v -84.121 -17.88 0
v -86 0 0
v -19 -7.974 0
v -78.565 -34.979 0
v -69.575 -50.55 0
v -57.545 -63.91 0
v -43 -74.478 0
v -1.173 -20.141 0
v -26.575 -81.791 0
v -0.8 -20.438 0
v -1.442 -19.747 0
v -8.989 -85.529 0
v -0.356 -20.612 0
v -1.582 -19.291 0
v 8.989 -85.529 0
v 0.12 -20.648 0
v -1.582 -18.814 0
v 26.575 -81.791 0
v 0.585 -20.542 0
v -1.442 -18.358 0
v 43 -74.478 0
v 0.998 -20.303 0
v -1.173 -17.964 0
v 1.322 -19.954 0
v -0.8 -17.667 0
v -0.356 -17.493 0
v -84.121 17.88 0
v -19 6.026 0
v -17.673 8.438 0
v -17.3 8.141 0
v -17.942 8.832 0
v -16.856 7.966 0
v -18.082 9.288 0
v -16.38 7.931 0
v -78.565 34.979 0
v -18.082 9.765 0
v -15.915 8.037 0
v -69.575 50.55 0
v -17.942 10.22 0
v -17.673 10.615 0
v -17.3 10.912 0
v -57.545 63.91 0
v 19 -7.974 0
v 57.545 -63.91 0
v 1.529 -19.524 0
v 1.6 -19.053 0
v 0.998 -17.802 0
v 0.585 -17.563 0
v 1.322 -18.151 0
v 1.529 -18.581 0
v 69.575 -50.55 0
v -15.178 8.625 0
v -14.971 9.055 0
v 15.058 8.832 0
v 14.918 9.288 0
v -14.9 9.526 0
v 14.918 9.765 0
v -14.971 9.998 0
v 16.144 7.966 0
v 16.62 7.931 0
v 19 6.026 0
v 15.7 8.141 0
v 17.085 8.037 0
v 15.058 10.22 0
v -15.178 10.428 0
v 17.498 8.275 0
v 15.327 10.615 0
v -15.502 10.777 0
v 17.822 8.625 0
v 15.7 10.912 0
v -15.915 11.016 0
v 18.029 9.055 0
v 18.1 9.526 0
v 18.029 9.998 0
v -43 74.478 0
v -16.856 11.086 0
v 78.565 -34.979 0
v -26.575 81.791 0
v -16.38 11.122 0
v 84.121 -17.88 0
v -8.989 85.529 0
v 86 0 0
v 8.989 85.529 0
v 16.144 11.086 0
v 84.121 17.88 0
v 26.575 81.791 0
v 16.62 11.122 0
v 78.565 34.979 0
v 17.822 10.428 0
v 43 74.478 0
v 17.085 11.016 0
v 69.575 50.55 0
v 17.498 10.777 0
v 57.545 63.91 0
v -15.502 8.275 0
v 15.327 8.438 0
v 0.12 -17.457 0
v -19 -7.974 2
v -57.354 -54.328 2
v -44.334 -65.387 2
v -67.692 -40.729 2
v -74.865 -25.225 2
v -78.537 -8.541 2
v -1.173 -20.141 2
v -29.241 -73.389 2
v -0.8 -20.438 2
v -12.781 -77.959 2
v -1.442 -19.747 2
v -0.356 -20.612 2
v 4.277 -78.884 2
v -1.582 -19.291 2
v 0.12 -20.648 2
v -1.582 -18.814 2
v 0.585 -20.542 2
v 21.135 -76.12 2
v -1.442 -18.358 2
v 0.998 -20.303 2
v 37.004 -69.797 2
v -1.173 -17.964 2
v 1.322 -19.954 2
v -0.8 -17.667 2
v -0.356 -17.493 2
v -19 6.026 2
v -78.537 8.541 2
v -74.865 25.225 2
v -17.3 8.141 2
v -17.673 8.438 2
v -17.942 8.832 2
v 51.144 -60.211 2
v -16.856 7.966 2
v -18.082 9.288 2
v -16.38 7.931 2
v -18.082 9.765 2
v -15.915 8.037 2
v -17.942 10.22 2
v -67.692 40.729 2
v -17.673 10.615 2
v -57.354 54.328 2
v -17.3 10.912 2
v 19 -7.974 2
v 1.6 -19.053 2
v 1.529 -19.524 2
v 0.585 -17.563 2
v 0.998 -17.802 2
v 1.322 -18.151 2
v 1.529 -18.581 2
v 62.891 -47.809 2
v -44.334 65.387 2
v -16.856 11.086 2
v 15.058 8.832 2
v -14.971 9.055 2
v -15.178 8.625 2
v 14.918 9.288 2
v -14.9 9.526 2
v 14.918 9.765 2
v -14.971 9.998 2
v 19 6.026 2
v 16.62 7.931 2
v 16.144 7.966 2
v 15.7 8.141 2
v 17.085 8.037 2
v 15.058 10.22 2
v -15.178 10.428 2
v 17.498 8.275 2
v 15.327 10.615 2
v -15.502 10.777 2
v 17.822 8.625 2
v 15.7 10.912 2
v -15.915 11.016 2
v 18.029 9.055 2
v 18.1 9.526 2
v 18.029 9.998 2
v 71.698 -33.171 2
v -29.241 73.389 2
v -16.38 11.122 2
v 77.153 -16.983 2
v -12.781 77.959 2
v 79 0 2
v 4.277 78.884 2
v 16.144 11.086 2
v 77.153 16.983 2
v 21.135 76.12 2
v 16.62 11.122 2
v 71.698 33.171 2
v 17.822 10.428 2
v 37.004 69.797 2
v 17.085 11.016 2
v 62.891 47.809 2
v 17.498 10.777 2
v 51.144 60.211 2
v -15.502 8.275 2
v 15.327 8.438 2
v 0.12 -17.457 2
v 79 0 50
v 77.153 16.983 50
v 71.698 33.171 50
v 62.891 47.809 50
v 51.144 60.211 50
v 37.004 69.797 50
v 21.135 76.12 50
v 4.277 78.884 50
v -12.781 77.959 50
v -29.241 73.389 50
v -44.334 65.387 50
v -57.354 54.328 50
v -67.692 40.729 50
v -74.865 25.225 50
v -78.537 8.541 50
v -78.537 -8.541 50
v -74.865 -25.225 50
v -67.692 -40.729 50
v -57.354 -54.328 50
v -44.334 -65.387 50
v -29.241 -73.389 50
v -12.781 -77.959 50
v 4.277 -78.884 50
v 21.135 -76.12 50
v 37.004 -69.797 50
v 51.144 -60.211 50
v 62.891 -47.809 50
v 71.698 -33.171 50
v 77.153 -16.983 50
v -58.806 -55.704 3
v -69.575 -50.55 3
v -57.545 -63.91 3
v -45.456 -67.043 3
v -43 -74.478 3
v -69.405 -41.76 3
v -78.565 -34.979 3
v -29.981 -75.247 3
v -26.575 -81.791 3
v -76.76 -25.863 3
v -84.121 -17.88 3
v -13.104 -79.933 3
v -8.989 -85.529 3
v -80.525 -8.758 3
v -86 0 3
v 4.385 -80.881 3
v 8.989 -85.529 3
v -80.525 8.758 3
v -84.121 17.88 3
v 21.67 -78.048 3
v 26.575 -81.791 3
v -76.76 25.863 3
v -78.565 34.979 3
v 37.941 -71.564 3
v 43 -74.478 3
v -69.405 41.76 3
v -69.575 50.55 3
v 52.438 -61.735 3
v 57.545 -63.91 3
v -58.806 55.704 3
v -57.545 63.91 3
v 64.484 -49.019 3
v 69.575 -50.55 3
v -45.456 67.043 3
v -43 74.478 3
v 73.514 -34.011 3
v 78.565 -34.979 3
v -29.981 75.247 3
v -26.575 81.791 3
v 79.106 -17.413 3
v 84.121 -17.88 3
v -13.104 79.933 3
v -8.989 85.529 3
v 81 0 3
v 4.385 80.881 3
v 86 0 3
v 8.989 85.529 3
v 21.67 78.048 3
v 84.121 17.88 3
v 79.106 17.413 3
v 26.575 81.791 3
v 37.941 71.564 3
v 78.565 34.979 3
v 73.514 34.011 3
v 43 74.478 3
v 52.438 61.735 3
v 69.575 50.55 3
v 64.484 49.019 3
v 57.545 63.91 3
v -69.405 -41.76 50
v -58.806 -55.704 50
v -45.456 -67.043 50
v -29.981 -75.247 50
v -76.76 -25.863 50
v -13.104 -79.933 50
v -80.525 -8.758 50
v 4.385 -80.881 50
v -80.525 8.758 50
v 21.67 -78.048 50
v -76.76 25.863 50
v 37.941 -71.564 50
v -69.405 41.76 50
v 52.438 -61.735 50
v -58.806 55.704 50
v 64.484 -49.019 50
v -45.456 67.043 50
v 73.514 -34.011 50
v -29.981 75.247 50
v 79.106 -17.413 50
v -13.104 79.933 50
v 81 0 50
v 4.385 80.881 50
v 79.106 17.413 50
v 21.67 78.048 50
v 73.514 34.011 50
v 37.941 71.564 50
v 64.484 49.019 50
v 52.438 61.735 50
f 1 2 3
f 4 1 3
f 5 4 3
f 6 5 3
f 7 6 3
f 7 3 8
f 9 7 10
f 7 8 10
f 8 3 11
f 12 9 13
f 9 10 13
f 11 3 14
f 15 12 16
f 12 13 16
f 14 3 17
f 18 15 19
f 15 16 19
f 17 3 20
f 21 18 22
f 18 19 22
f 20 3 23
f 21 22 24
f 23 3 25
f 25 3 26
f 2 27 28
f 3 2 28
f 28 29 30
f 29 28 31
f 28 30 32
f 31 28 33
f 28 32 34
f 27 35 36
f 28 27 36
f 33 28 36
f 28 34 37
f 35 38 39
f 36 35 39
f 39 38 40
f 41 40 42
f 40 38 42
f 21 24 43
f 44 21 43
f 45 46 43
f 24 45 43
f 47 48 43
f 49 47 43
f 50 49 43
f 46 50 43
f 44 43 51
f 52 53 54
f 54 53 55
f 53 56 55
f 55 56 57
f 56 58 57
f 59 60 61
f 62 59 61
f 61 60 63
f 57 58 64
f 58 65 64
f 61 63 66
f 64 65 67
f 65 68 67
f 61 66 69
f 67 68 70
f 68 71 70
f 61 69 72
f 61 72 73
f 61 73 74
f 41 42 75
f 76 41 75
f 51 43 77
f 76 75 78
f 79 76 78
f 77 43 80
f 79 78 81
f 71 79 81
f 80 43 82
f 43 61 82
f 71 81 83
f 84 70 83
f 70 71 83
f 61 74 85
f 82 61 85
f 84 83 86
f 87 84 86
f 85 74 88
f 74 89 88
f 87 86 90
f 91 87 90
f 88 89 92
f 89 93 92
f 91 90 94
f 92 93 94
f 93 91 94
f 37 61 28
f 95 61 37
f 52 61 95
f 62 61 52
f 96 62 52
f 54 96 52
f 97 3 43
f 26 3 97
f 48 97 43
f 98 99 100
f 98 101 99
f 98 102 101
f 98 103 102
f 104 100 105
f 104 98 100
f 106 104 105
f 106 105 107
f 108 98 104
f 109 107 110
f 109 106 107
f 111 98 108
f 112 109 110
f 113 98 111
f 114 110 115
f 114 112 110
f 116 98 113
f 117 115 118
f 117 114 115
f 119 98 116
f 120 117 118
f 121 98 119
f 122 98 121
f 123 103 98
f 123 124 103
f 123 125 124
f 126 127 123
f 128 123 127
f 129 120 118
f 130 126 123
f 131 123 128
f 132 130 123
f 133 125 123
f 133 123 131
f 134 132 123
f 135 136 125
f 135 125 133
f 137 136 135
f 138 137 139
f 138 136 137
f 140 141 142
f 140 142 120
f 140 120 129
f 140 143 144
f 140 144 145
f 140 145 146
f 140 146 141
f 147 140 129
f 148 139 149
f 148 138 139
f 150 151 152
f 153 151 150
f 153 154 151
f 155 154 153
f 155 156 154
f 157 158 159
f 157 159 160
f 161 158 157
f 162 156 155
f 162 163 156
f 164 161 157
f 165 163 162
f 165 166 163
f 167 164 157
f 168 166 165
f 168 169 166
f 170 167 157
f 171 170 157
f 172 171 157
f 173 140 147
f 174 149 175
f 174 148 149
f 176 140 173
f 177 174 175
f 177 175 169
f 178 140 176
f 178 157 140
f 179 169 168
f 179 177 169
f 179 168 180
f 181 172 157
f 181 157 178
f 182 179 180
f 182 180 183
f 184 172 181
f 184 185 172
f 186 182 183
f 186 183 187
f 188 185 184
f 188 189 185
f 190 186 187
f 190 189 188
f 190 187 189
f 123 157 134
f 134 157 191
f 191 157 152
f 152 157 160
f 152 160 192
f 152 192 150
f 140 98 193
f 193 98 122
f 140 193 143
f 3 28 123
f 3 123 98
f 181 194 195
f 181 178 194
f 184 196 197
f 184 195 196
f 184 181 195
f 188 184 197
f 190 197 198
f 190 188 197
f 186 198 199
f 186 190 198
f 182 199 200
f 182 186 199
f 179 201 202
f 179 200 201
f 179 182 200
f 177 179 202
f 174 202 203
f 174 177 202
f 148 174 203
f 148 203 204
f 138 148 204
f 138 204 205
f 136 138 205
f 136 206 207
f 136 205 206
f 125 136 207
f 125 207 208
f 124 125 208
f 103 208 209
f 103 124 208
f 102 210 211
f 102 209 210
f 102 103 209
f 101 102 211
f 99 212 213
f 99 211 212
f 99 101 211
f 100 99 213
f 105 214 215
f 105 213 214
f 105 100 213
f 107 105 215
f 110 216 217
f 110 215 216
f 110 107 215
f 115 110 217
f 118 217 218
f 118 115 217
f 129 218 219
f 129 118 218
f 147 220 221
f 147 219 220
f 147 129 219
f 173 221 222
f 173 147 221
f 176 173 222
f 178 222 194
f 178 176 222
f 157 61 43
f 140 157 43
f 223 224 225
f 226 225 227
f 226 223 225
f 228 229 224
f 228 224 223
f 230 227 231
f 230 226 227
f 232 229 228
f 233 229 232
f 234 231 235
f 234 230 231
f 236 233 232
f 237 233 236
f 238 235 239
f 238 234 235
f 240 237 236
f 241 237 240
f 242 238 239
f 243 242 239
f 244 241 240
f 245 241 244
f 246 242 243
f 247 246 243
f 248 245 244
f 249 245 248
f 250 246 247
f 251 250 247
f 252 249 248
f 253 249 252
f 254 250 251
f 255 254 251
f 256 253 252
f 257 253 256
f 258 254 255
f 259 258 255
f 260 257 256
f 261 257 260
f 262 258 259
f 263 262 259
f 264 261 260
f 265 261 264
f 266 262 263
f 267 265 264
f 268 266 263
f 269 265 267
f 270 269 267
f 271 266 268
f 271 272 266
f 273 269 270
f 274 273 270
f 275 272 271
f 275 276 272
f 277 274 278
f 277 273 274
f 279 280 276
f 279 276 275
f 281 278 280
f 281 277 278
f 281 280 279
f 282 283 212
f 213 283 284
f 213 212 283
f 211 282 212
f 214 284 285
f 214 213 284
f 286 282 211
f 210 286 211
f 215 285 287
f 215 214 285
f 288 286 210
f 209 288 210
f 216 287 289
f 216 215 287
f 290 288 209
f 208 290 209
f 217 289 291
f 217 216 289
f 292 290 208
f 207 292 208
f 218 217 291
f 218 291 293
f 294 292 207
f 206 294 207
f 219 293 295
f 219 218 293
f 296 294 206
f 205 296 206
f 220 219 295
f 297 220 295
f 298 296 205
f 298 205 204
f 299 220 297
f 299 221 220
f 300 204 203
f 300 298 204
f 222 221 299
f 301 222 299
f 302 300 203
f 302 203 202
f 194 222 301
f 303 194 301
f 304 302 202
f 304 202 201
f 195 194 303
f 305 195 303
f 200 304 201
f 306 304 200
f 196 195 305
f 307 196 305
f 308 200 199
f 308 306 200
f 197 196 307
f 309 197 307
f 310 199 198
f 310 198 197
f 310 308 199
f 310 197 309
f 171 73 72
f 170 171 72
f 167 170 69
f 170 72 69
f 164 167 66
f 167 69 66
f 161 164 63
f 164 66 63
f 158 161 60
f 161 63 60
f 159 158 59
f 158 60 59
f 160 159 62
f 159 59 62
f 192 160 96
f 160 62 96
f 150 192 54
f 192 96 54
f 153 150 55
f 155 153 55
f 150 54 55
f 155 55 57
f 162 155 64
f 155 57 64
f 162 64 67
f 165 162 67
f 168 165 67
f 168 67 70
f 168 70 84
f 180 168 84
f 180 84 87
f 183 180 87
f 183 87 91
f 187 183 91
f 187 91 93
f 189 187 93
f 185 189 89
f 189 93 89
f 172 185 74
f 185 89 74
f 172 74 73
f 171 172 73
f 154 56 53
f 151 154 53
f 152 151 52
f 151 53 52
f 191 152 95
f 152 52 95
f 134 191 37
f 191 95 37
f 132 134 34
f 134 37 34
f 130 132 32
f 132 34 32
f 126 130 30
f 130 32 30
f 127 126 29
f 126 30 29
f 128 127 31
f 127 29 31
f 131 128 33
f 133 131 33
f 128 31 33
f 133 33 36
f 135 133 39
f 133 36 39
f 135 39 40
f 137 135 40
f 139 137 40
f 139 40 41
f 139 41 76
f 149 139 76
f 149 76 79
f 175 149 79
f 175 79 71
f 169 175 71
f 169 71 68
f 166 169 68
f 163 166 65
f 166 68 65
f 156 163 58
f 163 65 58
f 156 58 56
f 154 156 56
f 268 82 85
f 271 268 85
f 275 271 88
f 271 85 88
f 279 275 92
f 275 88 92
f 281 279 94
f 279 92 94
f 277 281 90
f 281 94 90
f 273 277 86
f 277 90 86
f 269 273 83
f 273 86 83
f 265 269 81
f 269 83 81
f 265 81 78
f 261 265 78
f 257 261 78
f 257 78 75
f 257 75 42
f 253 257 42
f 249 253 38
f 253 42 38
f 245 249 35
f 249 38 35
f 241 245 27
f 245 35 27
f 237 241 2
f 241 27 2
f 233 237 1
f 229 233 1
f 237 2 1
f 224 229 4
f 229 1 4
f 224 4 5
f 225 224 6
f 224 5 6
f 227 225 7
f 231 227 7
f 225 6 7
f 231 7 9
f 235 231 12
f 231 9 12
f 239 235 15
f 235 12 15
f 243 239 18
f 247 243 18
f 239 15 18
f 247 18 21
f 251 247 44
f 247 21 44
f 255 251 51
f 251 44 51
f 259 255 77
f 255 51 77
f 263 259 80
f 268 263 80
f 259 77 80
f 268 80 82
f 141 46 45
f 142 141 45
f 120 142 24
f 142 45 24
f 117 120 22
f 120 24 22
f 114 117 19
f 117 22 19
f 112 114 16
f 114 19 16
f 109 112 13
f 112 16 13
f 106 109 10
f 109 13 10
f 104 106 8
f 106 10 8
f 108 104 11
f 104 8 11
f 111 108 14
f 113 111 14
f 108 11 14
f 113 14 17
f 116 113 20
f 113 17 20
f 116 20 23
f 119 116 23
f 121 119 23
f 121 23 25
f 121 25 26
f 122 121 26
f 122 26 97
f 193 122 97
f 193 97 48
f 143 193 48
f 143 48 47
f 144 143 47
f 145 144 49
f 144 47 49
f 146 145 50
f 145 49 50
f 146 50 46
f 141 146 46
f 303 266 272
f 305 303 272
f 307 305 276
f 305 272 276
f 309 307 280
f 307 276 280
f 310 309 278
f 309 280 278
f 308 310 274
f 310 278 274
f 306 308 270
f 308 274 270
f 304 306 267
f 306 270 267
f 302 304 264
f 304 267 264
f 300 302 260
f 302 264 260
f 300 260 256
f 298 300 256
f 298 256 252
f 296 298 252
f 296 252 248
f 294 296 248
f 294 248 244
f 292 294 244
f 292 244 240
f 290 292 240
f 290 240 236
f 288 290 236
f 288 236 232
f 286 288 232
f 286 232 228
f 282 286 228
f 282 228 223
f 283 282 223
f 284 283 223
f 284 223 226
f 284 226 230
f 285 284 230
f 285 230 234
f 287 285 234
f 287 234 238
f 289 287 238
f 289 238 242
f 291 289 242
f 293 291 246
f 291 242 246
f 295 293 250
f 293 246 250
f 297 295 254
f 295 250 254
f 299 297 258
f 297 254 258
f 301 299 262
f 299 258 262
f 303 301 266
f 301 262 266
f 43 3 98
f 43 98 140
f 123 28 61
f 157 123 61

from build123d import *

# Parameters (mm, degrees)
F0_R     = 86
F0_R_2   = 81
F1_DEPTH = 3
F2_DEPTH = 50
F3_T     = -2
F4_R     = 1.6
F4_W     = 38
F4_H     = 14
F5_DEPTH = 2


with BuildPart() as f1:
    # F0 (on Top) → F1 (new body)
    with BuildSketch(Plane.XY):
        Circle(F0_R)
        Circle(F0_R_2, mode=Mode.SUBTRACT)
        Circle(F0_R_2)
    extrude(amount=F1_DEPTH)

    # F0 (on Top) → F2 (join)
    with BuildSketch(Plane.XY):
        Circle(F0_R_2)
    extrude(amount=F2_DEPTH)

    # F3
    f3_openings = [f1.faces().sort_by_distance(p)[0] for p in [
        (0, 0, 50),
    ]]
    offset(amount=F3_T, openings=f3_openings, kind=Kind.INTERSECTION)

    # F4 (on face) → F5 (cut)
    with BuildSketch(Plane(origin=(0, 0, 0), x_dir=(1, 0, 0), z_dir=(0, 0, -1))):
        with Locations((0, 19.0525588833)):
            Circle(F4_R)
        with Locations((0, 0.9737205584)):
            Rectangle(F4_W, F4_H)
        with Locations((16.5, -9.5262794416)):
            Circle(F4_R)
        with Locations((-16.5, -9.5262794416)):
            Circle(F4_R)
    extrude(amount=-F5_DEPTH, mode=Mode.SUBTRACT)


solid = f1.part
